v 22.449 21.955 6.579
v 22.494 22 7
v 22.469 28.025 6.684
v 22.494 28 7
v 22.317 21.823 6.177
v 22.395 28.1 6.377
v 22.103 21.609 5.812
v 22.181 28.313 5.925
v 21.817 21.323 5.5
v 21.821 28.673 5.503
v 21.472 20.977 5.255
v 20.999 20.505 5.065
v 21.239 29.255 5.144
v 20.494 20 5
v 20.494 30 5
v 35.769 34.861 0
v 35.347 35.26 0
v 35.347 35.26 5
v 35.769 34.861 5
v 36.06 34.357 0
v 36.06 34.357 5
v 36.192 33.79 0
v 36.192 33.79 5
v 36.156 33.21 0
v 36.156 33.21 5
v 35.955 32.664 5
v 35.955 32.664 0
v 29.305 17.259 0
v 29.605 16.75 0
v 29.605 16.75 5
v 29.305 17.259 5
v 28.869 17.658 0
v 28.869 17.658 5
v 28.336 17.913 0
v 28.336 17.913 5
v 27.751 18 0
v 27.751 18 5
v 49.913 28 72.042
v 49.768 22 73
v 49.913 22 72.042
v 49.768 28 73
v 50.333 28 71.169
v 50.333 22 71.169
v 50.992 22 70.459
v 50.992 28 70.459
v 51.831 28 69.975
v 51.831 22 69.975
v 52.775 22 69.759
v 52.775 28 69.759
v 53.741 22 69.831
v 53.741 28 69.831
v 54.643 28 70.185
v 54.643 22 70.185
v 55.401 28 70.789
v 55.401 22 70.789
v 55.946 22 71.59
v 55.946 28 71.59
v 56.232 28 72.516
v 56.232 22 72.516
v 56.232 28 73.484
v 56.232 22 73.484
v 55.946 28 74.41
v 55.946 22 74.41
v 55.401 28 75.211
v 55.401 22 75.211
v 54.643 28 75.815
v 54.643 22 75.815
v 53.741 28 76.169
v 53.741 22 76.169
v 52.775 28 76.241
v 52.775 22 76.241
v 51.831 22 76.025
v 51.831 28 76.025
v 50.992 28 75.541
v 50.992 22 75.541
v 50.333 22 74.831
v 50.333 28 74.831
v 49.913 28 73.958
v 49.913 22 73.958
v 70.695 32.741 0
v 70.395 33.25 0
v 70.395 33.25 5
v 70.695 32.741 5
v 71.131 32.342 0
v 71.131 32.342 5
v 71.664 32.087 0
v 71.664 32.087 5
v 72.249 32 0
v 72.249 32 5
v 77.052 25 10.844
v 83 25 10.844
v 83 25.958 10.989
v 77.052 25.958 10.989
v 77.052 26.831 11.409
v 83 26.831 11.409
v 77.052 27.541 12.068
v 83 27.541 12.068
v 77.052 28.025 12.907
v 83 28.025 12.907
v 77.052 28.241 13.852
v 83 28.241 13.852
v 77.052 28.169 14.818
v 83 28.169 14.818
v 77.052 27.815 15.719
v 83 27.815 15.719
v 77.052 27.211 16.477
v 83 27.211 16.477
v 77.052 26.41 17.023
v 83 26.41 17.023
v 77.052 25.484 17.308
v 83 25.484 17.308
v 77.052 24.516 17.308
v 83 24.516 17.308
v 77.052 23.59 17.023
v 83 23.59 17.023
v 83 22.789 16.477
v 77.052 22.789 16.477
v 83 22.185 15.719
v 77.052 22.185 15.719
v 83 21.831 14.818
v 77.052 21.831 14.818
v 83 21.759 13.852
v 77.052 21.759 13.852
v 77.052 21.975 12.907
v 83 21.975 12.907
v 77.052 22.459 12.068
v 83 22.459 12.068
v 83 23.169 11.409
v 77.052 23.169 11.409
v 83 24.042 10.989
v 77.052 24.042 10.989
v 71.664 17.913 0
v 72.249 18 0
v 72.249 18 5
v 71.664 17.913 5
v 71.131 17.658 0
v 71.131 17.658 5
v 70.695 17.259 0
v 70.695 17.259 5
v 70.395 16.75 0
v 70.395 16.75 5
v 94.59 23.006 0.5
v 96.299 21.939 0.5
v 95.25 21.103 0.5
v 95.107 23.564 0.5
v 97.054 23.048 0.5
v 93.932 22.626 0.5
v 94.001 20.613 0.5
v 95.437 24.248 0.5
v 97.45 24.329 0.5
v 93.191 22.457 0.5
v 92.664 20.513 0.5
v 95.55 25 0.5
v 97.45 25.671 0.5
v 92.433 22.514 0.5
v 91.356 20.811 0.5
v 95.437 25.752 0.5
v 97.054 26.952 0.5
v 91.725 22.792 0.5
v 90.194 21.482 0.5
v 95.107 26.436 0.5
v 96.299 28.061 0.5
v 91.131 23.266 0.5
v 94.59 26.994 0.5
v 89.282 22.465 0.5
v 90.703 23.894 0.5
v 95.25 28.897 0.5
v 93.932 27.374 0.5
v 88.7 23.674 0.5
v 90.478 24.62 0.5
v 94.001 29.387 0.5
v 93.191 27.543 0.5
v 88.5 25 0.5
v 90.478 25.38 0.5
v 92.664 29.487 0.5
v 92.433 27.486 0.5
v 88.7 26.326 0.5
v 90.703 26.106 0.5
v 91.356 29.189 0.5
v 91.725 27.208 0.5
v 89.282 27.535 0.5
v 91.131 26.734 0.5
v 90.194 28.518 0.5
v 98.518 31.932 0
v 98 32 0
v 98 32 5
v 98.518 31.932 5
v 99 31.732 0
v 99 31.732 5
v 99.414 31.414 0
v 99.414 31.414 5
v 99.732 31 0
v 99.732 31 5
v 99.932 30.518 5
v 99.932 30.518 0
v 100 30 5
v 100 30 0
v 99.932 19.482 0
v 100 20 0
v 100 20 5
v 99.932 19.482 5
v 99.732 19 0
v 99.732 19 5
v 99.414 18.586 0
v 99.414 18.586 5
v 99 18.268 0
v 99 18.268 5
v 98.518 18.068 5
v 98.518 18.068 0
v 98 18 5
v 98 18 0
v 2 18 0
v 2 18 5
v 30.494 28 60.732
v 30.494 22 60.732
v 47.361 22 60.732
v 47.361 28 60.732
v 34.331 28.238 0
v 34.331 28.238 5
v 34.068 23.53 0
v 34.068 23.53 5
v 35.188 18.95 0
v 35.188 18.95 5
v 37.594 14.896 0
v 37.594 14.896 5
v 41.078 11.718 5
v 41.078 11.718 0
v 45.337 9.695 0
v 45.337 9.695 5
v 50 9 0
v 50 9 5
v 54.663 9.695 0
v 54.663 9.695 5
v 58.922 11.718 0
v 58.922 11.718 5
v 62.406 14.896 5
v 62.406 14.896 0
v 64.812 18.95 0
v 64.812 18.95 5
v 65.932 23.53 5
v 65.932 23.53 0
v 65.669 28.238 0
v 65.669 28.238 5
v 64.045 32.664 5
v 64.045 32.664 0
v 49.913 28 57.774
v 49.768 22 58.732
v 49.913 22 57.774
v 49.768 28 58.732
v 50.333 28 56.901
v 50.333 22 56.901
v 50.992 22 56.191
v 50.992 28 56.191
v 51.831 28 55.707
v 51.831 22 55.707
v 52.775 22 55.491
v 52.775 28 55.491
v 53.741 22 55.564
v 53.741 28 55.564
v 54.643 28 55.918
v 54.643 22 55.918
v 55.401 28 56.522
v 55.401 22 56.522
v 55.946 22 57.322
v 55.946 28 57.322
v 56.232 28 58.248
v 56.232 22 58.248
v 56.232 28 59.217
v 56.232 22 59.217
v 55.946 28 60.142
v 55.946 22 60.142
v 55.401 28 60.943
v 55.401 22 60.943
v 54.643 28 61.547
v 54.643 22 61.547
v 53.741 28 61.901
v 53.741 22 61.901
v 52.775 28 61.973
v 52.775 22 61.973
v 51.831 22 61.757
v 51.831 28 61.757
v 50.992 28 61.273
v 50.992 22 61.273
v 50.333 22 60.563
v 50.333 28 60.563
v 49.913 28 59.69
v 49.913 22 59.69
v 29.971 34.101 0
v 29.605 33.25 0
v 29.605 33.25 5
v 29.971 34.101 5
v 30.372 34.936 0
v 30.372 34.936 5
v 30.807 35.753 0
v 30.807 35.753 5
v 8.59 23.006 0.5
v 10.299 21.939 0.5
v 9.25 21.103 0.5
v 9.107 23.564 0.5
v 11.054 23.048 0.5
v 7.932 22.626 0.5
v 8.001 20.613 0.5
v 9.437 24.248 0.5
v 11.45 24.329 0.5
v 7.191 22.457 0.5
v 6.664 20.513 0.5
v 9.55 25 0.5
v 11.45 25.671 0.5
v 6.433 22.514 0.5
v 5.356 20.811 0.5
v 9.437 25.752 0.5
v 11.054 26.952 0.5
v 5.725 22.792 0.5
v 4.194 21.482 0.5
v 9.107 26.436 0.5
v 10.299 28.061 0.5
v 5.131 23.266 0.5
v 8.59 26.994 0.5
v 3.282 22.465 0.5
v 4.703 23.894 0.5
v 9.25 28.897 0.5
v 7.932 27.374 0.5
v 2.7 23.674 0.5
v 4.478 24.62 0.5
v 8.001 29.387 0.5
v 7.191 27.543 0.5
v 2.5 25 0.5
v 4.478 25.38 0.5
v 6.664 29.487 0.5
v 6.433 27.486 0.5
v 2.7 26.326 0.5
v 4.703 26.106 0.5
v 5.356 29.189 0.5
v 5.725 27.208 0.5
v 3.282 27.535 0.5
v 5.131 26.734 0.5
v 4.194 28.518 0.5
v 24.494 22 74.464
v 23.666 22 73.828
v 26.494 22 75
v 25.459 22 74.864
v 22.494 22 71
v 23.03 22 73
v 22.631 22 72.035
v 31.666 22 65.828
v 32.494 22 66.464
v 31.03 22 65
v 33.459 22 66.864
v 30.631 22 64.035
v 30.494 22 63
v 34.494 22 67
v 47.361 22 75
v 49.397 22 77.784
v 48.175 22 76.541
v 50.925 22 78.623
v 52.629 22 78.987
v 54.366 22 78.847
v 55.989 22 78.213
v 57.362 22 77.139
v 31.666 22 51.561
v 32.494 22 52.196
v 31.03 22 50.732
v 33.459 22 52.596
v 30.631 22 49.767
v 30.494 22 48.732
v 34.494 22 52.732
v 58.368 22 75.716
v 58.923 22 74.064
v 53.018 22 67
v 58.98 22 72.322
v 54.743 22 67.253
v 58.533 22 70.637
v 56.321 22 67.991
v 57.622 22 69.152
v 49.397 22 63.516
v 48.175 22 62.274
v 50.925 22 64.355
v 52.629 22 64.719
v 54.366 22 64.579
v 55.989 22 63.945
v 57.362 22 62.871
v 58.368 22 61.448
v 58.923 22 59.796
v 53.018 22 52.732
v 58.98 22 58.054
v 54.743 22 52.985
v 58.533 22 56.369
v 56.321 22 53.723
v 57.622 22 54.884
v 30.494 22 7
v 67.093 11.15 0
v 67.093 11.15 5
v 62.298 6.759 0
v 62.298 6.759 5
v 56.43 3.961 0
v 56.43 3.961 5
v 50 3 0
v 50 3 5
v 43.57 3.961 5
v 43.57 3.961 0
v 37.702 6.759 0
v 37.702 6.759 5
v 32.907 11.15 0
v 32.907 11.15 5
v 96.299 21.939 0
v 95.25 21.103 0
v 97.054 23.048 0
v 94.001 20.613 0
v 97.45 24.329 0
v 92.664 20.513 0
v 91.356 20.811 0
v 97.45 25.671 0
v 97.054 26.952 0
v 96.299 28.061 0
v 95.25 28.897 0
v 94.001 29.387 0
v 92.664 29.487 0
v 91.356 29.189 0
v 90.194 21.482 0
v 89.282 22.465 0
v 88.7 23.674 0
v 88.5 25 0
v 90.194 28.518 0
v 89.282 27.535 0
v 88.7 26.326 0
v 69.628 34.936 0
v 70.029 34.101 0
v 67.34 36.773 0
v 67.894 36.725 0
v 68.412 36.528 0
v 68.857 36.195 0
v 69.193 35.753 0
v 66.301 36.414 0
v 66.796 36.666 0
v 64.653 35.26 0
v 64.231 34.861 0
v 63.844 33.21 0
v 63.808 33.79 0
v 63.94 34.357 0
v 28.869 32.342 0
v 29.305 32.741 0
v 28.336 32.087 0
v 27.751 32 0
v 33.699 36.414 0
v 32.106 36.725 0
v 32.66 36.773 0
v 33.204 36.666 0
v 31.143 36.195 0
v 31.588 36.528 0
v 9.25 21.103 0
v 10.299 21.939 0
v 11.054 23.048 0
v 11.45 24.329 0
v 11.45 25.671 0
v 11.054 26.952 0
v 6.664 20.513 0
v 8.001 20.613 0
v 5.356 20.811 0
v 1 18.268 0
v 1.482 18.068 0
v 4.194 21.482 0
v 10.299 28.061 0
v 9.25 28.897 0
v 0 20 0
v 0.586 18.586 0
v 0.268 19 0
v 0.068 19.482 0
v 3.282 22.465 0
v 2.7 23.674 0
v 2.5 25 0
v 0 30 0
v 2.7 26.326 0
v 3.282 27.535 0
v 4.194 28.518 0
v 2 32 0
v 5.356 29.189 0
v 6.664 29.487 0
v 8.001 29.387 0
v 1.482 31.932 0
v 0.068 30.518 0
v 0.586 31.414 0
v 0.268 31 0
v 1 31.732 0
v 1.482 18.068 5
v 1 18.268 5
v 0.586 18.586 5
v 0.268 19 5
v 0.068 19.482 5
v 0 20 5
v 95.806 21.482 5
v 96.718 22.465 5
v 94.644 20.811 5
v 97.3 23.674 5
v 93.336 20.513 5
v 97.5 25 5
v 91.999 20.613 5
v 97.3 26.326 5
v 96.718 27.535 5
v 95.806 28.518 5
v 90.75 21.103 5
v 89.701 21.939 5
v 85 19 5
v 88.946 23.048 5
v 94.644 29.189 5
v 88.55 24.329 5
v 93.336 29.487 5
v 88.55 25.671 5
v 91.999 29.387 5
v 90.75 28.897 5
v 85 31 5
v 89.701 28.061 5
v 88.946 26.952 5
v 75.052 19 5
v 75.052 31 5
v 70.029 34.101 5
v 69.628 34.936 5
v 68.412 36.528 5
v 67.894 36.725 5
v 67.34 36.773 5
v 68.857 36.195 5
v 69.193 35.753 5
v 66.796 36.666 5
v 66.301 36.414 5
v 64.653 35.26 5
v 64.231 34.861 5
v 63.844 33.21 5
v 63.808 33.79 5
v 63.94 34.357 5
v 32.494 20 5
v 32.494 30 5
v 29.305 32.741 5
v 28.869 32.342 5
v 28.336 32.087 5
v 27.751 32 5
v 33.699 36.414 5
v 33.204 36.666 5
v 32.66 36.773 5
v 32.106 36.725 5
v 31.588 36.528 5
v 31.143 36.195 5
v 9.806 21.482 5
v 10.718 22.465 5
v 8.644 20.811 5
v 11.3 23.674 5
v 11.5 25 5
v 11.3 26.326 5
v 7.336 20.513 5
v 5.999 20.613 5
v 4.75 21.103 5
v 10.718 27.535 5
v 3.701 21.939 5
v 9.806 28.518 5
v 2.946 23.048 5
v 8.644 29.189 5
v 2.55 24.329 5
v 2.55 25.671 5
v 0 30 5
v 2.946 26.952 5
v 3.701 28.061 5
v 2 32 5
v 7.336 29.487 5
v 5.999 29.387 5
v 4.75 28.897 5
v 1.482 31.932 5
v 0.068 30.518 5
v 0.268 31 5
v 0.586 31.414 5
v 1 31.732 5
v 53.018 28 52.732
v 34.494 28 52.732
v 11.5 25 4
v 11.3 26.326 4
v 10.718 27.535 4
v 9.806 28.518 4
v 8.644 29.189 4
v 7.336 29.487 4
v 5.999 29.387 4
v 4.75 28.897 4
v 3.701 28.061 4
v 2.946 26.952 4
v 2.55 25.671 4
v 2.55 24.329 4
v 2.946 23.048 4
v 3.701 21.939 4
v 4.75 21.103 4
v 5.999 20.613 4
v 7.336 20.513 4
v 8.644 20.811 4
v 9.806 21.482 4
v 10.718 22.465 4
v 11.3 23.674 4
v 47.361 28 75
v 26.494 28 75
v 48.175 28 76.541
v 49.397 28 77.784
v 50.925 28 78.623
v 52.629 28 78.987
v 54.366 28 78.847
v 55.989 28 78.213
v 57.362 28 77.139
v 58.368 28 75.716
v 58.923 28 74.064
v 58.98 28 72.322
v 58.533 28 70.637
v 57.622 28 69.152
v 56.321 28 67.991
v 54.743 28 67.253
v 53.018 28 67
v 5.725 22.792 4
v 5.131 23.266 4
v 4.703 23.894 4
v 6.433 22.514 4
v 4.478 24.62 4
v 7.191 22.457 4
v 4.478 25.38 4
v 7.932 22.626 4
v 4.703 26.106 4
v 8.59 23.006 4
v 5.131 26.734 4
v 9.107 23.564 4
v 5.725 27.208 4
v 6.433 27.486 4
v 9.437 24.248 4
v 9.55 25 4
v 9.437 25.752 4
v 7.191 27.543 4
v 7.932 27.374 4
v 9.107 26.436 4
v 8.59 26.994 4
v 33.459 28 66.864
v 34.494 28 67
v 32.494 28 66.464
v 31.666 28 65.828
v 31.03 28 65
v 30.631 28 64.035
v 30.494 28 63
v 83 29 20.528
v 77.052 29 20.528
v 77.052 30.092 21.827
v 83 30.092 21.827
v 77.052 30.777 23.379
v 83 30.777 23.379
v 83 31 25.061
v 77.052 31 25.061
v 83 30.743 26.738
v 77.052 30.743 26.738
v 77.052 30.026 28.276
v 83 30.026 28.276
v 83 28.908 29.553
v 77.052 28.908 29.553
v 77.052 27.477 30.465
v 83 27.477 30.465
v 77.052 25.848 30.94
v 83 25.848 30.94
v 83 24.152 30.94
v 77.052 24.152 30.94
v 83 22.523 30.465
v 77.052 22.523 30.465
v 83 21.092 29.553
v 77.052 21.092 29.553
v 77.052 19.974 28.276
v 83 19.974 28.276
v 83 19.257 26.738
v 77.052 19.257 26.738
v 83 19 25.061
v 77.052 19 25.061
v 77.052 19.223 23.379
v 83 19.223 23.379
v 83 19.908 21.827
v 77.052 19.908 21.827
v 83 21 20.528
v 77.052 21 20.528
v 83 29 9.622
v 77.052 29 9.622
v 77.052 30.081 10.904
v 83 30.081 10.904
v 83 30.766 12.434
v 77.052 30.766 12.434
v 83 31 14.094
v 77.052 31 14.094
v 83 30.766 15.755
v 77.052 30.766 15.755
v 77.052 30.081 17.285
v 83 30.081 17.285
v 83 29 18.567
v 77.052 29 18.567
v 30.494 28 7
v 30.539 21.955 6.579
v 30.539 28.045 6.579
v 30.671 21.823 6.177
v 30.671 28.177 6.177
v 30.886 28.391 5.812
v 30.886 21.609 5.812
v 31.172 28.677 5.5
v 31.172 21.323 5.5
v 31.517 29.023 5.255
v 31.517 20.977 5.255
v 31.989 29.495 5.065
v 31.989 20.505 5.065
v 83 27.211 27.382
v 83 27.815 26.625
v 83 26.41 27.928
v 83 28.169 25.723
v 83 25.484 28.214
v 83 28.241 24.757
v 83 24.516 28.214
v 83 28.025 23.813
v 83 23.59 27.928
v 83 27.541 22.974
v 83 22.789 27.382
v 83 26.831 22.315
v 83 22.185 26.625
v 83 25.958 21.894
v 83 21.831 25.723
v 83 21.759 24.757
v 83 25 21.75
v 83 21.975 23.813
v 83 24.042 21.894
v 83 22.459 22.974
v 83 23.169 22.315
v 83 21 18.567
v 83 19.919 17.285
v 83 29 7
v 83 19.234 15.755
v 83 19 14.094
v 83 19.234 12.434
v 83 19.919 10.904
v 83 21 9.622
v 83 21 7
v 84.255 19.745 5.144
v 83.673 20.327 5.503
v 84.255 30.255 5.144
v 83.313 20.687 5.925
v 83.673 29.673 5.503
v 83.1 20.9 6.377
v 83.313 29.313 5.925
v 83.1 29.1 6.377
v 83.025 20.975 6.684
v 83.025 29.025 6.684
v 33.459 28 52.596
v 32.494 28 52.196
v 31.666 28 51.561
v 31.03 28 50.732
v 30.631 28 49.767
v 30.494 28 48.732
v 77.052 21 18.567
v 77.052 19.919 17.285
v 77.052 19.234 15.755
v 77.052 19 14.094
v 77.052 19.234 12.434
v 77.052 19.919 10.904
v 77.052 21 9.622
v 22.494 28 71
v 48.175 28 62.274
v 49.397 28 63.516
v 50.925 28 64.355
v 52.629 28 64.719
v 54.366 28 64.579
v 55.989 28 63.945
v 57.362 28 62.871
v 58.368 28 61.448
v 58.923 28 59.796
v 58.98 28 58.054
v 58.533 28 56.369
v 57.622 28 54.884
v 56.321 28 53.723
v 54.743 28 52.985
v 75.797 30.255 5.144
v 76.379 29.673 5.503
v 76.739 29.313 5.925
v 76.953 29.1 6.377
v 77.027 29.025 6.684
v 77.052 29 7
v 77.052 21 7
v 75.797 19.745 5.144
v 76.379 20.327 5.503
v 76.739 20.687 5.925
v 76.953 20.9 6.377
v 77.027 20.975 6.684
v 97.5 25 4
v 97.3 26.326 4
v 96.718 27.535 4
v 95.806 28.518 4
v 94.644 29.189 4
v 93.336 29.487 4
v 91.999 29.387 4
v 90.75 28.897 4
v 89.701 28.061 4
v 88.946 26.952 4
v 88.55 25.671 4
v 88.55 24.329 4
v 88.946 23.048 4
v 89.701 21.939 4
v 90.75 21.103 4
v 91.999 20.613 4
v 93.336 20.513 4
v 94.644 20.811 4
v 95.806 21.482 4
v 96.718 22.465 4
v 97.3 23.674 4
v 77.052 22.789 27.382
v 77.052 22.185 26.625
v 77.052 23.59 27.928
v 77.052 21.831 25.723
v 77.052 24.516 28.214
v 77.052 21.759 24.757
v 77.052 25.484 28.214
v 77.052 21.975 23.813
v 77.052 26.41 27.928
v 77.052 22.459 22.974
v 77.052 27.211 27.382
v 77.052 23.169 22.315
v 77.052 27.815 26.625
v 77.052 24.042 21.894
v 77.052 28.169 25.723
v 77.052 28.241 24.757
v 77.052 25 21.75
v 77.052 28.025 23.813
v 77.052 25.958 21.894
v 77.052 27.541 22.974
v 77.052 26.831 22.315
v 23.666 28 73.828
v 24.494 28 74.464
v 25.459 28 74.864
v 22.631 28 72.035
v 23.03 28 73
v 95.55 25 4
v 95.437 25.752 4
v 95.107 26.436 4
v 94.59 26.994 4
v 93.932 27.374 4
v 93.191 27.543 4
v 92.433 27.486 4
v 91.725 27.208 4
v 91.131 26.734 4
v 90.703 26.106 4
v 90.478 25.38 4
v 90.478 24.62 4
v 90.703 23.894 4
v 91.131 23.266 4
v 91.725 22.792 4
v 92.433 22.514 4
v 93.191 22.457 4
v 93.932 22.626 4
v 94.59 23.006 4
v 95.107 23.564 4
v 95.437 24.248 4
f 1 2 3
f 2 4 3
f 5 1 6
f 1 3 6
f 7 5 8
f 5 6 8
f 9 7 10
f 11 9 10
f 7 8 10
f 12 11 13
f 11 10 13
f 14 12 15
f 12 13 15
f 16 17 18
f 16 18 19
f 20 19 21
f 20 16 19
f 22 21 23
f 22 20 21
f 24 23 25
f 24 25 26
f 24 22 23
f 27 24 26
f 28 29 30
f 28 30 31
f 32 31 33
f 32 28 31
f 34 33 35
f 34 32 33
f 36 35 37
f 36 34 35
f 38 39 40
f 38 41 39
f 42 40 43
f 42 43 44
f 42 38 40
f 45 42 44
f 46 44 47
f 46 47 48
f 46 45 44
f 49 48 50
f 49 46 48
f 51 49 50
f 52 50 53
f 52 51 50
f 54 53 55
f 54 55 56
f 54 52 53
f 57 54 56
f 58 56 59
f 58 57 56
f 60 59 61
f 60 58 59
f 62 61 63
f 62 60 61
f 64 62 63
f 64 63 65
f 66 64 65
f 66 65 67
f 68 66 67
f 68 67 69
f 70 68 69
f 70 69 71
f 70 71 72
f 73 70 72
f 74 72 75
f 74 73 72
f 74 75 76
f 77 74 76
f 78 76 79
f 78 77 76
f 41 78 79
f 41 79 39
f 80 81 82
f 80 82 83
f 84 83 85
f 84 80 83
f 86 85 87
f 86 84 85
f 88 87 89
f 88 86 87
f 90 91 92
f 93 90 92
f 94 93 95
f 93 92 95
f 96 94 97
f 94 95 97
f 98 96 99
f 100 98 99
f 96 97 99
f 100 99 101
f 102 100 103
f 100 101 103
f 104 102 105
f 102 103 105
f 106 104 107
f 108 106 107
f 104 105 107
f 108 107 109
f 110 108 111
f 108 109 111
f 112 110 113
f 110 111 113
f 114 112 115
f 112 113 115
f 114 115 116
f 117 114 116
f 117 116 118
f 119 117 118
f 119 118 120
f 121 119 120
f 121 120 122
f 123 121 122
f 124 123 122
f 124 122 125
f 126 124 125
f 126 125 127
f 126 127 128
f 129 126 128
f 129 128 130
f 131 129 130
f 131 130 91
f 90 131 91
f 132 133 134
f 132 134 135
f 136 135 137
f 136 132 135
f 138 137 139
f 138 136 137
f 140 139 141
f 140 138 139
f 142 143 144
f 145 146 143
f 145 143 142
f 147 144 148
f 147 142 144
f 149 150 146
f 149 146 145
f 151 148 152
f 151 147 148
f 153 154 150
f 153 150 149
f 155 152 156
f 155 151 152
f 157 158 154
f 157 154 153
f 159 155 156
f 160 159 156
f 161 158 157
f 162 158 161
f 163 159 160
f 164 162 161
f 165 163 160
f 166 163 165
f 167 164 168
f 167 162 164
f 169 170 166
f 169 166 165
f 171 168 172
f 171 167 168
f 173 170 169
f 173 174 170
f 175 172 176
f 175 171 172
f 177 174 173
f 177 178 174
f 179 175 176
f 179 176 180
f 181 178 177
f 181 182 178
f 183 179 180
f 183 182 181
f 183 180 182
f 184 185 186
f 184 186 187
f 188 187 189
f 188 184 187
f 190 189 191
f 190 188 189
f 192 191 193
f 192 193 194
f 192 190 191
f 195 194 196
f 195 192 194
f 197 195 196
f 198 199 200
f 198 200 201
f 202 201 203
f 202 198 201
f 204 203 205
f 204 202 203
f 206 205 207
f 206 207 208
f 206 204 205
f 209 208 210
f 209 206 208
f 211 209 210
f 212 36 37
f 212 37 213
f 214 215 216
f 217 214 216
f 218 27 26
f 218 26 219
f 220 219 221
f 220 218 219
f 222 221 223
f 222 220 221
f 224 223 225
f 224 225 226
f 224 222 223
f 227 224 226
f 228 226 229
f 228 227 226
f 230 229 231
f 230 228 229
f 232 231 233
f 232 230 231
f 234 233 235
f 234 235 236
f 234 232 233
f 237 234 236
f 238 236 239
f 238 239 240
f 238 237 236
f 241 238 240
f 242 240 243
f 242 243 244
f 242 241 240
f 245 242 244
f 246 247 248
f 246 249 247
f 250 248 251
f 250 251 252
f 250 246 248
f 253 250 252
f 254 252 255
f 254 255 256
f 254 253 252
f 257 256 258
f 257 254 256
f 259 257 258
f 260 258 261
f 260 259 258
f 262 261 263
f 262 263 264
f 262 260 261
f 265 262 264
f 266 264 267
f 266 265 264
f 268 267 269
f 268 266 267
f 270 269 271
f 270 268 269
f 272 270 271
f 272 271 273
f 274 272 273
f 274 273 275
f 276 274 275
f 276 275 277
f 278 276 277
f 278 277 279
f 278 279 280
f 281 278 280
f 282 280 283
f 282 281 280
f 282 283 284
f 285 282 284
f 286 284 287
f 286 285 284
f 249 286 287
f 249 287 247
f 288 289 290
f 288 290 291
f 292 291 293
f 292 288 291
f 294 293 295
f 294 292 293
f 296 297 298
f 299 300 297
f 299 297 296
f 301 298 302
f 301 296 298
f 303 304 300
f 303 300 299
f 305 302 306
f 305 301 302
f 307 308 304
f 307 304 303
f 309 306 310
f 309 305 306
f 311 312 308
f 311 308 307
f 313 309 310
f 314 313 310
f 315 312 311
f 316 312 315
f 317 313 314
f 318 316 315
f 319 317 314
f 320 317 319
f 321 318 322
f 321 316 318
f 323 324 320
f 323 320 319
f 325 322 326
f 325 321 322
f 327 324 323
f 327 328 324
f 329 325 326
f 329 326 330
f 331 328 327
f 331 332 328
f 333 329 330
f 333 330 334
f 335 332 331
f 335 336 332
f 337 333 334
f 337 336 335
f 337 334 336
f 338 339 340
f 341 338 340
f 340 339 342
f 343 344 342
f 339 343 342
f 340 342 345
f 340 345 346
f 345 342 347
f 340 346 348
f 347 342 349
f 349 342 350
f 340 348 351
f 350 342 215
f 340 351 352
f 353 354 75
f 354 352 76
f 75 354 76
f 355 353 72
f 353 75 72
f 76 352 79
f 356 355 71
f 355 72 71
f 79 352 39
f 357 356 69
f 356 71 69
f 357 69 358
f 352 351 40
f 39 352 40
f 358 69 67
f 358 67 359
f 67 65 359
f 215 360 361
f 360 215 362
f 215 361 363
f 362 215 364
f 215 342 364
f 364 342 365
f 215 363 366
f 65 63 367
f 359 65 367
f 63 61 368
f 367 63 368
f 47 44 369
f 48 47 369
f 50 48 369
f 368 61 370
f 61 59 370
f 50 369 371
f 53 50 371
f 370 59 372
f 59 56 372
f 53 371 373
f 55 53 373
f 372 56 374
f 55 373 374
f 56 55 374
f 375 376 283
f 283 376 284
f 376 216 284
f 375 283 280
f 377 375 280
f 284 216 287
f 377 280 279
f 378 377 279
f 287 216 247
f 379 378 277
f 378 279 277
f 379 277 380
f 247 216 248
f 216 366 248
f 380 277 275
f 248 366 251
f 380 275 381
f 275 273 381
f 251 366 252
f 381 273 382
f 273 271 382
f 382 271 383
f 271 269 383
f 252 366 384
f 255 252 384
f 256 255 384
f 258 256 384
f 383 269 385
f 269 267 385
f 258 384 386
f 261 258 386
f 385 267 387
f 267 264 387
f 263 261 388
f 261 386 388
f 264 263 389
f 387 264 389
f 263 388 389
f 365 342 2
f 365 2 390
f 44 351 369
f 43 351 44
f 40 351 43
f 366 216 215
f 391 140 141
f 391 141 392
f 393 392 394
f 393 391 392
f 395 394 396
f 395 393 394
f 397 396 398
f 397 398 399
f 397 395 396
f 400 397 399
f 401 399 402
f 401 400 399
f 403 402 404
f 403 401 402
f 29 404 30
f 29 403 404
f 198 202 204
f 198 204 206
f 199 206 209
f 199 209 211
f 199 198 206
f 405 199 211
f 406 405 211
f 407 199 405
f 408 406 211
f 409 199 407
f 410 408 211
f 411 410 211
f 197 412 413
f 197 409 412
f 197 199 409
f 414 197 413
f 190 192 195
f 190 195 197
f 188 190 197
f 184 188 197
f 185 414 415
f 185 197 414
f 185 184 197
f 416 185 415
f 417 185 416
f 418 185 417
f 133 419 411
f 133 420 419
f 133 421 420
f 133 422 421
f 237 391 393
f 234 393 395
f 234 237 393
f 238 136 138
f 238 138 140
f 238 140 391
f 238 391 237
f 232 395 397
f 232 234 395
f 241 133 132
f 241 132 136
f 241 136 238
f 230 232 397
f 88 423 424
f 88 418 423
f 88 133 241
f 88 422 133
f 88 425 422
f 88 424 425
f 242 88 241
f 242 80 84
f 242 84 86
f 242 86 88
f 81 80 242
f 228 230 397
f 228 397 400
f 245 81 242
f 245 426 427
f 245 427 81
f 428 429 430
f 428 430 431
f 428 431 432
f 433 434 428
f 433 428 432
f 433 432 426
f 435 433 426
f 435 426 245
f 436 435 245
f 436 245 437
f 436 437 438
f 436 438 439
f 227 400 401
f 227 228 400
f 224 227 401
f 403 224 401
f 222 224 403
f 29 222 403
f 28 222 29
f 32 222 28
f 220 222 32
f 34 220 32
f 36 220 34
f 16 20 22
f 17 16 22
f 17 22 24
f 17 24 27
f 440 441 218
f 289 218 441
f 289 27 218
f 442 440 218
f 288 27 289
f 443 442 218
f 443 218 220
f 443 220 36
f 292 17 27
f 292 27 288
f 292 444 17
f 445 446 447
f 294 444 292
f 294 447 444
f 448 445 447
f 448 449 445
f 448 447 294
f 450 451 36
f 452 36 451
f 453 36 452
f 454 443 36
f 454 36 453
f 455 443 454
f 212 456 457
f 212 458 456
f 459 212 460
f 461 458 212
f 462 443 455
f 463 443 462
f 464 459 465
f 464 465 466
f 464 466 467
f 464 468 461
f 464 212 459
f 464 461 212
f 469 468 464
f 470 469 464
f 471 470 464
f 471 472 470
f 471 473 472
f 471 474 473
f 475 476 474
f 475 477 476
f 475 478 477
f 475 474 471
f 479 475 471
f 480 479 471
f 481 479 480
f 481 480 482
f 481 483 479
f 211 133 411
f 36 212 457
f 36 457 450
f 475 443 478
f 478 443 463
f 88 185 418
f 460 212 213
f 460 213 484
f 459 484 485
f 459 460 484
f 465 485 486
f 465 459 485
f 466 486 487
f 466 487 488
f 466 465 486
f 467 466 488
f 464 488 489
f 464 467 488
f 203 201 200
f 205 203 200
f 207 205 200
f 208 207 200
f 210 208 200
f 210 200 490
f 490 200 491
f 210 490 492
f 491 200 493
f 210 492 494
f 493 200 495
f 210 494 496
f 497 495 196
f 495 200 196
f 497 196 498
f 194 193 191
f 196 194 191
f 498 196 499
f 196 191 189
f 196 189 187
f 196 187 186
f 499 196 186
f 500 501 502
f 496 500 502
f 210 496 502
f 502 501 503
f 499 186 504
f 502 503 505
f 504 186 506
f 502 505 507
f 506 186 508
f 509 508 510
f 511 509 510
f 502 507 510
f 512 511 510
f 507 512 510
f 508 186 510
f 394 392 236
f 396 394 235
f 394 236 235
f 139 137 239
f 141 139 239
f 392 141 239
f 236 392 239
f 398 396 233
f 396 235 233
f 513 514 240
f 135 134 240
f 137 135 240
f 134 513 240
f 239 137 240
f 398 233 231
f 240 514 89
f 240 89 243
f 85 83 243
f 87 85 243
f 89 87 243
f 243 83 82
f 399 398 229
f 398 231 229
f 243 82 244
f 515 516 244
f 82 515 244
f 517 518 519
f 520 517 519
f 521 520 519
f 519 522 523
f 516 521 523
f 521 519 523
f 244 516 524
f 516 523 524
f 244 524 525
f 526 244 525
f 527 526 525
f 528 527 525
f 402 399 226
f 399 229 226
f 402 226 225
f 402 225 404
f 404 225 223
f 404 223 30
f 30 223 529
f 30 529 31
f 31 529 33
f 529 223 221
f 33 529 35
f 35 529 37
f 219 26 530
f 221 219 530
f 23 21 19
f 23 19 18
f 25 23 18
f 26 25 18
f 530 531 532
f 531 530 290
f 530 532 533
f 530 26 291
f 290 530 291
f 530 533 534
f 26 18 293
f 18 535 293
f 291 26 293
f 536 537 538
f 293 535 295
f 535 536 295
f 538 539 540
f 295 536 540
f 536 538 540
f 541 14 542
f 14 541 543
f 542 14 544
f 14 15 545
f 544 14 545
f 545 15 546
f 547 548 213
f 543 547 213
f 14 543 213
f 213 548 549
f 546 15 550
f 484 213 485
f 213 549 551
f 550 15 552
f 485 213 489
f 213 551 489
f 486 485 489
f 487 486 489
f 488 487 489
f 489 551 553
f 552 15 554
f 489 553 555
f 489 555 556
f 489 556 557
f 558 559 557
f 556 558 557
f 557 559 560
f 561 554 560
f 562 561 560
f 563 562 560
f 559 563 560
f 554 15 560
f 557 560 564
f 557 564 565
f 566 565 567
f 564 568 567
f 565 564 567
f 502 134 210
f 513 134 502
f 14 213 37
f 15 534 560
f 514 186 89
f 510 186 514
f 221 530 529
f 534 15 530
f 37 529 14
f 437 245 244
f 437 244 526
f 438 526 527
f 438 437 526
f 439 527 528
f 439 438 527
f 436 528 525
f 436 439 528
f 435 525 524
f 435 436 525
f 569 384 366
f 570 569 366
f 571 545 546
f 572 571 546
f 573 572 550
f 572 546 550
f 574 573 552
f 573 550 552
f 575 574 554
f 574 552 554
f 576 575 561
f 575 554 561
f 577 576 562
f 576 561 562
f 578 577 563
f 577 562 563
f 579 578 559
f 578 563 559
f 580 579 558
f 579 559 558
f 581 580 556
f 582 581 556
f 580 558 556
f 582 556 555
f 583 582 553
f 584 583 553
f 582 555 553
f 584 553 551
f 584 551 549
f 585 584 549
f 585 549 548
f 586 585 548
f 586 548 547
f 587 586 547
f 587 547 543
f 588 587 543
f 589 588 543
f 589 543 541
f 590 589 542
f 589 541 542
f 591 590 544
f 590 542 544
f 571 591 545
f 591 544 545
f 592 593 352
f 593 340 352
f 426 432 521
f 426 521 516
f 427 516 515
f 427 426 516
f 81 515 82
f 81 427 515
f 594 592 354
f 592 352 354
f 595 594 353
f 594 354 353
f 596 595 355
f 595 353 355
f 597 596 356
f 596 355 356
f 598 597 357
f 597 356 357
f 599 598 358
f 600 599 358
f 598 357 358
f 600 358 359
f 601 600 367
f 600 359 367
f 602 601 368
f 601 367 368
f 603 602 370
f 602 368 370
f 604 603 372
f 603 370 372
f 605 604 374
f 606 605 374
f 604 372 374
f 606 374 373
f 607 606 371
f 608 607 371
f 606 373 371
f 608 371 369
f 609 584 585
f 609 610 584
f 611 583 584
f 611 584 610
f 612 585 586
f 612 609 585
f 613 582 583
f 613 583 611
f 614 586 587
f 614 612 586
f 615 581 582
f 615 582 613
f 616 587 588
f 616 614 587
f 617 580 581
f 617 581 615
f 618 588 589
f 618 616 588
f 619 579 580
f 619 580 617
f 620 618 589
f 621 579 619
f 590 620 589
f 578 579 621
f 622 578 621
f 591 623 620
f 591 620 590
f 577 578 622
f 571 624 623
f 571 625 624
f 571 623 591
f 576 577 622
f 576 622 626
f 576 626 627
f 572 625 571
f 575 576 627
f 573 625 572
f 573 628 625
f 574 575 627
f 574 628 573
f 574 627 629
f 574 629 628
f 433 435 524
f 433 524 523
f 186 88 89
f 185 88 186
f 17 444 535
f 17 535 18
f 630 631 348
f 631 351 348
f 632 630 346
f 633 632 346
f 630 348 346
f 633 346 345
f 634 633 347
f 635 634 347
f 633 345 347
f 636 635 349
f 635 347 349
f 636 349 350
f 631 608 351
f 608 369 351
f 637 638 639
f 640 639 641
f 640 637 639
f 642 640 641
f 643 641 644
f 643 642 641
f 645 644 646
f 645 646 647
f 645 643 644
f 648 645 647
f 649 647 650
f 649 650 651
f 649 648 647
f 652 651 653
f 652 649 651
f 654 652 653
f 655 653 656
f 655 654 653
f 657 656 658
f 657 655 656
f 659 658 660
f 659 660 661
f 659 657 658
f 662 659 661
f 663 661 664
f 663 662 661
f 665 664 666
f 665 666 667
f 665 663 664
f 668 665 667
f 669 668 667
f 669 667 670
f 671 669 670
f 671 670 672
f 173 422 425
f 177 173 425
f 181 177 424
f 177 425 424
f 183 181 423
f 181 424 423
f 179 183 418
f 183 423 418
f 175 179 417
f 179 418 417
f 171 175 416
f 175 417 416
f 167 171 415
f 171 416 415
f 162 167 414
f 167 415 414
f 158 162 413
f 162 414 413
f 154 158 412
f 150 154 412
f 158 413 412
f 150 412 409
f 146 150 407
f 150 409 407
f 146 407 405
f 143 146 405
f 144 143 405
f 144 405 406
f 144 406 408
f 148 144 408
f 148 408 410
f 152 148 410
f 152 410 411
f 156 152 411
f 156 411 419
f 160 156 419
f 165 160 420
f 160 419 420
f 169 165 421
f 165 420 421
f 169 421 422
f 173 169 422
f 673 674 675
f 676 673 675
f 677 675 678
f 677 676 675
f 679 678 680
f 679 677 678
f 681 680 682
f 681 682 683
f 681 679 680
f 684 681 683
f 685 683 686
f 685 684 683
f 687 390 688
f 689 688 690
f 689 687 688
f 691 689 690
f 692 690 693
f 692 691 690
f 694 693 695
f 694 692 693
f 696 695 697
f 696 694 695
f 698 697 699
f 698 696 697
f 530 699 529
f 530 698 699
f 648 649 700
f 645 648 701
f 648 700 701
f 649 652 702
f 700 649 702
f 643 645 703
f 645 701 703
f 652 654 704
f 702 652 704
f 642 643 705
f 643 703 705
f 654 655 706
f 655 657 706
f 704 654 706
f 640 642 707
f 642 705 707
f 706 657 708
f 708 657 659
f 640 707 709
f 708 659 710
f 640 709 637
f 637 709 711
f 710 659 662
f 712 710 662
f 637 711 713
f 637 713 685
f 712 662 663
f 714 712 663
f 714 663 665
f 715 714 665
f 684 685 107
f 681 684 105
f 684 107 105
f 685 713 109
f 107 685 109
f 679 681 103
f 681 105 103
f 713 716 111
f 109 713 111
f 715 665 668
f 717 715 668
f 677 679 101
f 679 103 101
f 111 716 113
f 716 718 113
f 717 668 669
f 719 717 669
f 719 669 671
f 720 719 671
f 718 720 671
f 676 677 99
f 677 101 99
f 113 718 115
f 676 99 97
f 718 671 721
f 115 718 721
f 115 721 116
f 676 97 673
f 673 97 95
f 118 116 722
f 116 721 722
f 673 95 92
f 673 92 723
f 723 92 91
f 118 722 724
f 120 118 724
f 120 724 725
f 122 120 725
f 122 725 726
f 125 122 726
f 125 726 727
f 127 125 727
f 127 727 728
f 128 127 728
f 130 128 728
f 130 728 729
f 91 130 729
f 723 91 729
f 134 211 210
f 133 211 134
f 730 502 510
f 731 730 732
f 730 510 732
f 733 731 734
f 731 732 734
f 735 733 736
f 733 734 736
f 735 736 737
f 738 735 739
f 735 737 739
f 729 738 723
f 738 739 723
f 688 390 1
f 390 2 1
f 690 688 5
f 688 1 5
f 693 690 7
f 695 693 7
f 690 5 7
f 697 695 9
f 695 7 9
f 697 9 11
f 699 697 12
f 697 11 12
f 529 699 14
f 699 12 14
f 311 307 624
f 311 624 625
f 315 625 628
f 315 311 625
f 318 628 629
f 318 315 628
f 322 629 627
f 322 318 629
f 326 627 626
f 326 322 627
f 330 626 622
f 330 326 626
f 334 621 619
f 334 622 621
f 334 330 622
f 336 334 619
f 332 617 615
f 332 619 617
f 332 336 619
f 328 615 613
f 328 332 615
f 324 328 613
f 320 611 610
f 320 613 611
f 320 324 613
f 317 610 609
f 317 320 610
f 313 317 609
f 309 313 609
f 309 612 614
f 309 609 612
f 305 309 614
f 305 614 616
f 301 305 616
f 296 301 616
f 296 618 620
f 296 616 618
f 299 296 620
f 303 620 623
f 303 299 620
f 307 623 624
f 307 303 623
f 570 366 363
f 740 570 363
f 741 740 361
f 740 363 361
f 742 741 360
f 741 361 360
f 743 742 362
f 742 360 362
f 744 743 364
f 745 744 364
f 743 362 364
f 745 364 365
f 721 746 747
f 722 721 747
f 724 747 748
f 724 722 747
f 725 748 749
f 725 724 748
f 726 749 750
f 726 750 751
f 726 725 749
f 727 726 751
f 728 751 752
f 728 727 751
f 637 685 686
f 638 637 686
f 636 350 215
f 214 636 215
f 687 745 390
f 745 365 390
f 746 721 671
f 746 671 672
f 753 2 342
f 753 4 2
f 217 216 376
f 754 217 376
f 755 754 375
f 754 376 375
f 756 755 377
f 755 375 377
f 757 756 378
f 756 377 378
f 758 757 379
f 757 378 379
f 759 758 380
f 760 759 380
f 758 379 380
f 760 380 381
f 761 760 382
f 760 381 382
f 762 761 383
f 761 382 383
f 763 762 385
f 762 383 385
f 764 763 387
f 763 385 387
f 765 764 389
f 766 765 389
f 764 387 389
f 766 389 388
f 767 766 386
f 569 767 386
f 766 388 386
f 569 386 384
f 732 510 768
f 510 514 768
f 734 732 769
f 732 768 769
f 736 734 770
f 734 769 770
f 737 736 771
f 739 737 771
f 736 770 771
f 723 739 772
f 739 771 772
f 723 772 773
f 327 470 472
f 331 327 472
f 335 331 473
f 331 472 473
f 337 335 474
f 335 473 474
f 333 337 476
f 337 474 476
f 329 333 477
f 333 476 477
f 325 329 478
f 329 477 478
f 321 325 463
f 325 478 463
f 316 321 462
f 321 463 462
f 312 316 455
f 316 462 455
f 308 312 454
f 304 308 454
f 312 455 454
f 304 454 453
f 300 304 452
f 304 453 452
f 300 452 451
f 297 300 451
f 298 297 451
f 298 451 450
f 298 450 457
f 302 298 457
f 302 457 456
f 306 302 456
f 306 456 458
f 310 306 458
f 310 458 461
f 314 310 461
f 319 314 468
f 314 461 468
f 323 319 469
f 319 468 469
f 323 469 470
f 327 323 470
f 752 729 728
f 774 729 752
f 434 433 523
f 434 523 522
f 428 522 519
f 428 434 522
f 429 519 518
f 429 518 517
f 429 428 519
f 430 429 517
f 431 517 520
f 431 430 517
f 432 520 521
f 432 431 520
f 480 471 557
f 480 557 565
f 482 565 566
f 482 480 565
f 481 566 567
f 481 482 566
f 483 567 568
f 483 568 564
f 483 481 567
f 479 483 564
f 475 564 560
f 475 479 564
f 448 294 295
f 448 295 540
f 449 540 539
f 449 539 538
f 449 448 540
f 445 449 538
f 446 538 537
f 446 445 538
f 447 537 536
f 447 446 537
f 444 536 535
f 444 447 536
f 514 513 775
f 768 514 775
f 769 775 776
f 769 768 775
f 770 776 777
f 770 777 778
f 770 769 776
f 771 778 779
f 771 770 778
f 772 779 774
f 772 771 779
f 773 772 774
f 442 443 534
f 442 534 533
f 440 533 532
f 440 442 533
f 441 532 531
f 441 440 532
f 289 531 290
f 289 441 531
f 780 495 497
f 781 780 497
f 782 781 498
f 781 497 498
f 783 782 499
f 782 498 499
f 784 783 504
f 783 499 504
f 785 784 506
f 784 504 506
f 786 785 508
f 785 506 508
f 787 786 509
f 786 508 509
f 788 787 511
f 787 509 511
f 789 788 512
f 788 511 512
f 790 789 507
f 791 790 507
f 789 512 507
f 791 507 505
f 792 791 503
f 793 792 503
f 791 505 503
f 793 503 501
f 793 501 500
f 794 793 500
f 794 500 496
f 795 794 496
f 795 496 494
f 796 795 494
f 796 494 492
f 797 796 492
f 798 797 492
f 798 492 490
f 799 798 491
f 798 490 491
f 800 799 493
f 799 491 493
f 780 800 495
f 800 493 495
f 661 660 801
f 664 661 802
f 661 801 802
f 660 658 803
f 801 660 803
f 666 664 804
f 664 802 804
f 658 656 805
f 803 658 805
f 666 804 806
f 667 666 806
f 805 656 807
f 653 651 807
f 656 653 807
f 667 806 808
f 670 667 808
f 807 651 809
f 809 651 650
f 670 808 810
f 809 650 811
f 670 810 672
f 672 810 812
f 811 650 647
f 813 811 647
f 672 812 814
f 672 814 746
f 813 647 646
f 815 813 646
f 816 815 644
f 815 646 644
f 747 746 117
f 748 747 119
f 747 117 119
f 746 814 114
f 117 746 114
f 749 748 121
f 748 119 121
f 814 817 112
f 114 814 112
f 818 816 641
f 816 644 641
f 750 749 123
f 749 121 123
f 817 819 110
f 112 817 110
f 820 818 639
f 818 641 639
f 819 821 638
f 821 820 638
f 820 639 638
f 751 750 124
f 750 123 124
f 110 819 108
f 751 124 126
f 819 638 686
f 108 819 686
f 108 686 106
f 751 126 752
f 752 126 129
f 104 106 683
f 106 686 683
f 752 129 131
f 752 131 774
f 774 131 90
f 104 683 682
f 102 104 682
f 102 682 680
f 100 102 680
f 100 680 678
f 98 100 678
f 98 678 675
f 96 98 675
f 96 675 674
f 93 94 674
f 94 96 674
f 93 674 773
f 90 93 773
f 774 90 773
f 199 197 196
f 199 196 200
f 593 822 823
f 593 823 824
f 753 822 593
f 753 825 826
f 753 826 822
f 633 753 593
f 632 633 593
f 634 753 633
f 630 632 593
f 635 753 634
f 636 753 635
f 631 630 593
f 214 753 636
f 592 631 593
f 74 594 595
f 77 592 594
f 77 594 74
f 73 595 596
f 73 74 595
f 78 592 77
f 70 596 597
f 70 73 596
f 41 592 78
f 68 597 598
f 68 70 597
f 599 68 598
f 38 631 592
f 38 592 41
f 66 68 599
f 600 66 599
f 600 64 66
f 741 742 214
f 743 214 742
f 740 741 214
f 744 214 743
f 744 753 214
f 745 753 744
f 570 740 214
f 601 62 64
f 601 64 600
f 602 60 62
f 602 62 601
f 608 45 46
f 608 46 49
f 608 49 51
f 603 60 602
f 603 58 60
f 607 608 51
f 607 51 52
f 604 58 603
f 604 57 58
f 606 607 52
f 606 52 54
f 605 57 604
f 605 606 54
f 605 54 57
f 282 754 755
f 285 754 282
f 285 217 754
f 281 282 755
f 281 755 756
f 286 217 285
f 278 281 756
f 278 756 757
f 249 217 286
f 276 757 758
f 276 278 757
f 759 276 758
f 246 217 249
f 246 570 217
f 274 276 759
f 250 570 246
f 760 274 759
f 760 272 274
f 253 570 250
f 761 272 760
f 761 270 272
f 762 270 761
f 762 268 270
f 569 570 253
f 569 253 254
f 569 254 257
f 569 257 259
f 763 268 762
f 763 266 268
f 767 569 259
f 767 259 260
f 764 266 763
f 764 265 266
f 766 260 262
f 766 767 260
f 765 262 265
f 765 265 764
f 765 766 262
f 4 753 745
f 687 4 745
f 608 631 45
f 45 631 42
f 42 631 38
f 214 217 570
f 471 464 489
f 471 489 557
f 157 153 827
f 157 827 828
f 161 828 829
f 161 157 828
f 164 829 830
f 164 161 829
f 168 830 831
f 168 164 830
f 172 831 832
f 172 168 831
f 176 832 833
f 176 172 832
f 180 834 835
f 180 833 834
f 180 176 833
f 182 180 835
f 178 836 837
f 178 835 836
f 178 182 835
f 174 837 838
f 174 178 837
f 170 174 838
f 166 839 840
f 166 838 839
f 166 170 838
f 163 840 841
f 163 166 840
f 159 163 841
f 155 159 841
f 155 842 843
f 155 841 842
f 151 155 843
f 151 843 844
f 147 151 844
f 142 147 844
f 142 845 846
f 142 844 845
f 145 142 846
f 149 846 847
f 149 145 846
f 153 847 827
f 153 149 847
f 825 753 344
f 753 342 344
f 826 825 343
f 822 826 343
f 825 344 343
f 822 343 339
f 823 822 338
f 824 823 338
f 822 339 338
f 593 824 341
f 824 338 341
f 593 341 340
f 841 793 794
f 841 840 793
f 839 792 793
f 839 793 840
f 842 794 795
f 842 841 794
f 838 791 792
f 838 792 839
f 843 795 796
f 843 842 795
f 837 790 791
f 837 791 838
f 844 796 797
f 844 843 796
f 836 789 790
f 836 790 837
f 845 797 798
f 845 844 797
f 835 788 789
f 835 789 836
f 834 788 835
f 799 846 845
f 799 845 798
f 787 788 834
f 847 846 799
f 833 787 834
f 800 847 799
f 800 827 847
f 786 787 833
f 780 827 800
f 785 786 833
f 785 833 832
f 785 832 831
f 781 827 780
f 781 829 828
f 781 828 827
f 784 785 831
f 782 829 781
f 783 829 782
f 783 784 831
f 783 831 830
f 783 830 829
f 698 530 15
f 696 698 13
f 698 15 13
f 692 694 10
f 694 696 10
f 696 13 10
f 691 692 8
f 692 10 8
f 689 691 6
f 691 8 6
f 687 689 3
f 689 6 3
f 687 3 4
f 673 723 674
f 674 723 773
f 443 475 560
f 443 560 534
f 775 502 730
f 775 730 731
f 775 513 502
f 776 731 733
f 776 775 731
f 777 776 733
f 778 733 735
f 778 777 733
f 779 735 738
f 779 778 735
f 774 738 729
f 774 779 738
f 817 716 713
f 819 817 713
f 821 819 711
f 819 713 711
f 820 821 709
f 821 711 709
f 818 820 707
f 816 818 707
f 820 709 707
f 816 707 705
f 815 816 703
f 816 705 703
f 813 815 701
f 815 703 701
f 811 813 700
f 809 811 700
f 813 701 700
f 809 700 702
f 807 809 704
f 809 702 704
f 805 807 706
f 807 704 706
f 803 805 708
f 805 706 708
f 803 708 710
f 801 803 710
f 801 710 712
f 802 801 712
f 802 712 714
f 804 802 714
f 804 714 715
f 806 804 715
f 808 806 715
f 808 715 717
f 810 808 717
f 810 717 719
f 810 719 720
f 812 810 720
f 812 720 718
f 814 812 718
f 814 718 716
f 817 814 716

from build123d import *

# Parameters (mm, degrees)
SKETCH1_R                = 2.55
BOSS_EXTRUDE1_DEPTH      = 5
SKETCH4_R                = 4.5
CUT_EXTRUDE2_DEPTH       = 1
SKETCH6_W                = 5.947651005
SKETCH6_H                = 20
BOSS_EXTRUDE2_DEPTH      = 4
BOSS_EXTRUDE2_DEPTH_BACK = 4
SKETCH11_R               = 4.5
CUT_EXTRUDE3_DEPTH       = 0.5
SKETCH16_R               = 3.25
BOSS_EXTRUDE3_DEPTH      = 3
BOSS_EXTRUDE3_DEPTH_BACK = 3
FILLET3_R                = 2
BOSS_EXTRUDE4_DEPTH      = 5.947651
CUT_EXTRUDE5_REACH       = 85
SKETCH18_R               = 3.25


with BuildPart() as part:
    # Sketch1 → Boss-Extrude1 (new body)
    with BuildSketch(Plane.XY):
        with BuildLine():
            Line((100, 25), (100, 20))
            ThreePointArc((100, 20), (99.414213562, 18.585786438), (98, 18))
            Line((98, 18), (72.248595461, 18))
            ThreePointArc((72.248595461, 18), (71.130561473, 17.658312395), (70.39454584, 16.75))
            ThreePointArc((70.39454584, 16.75), (50, 3), (29.60545416, 16.75))
            ThreePointArc((29.60545416, 16.75), (28.869438527, 17.658312395), (27.751404539, 18))
            Line((27.751404539, 18), (2, 18))
            ThreePointArc((2, 18), (0.585786438, 18.585786438), (0, 20))
            Line((0, 20), (0, 25))
            Line((0, 25), (0, 30))
            ThreePointArc((0, 30), (0.585786438, 31.414213562), (2, 32))
            Line((2, 32), (21.056240945, 32))
            Line((21.056240945, 32), (27.751404539, 32))
            ThreePointArc((27.751404539, 32), (28.869438527, 32.341687605), (29.60545416, 33.25))
            ThreePointArc((29.60545416, 33.25), (30.166752838, 34.520625347), (30.807119991, 35.753295167))
            ThreePointArc((30.807119991, 35.753295167), (32.106461975, 36.725482012), (33.699080137, 36.414026968))
            Line((33.699080137, 36.414026968), (35.34656276, 35.260447216))
            ThreePointArc((35.34656276, 35.260447216), (36.146649881, 34.078494315), (35.955031011, 32.664127224))
            ThreePointArc((35.955031011, 32.664127224), (50, 9), (64.044968989, 32.664127224))
            ThreePointArc((64.044968989, 32.664127224), (63.853350119, 34.078494315), (64.65343724, 35.260447216))
            Line((64.65343724, 35.260447216), (66.300919863, 36.414026968))
            ThreePointArc((66.300919863, 36.414026968), (67.893538025, 36.725482012), (69.192880009, 35.753295167))
            ThreePointArc((69.192880009, 35.753295167), (69.833247162, 34.520625347), (70.39454584, 33.25))
            ThreePointArc((70.39454584, 33.25), (71.130561473, 32.341687605), (72.248595461, 32))
            Line((72.248595461, 32), (78.943759055, 32))
            Line((78.943759055, 32), (98, 32))
            ThreePointArc((98, 32), (99.414213562, 31.414213562), (100, 30))
            Line((100, 30), (100, 25))
        make_face()
        with Locations((93, 25)):
            Circle(SKETCH1_R, mode=Mode.SUBTRACT)
        with Locations((7, 25)):
            Circle(SKETCH1_R, mode=Mode.SUBTRACT)
    extrude(amount=BOSS_EXTRUDE1_DEPTH)

    # Sketch4 → Cut-Extrude2 (cut)
    with BuildSketch(Plane.XY.offset(5)):
        with Locations((93, 25)):
            Circle(SKETCH4_R)
        with Locations((7, 25)):
            Circle(SKETCH4_R)
    extrude(amount=-CUT_EXTRUDE2_DEPTH, mode=Mode.SUBTRACT)

    # Sketch6 → Boss-Extrude2 (add, two sides)
    with BuildSketch(Plane(origin=(0, 25, 0), x_dir=(-1, 0, 0), z_dir=(0, -1, 0))) as boss_extrude2_sk:
        with Locations((-80.026174497, -15)):
            Rectangle(SKETCH6_W, SKETCH6_H)
    extrude(amount=BOSS_EXTRUDE2_DEPTH)
    extrude(boss_extrude2_sk.sketch, amount=-BOSS_EXTRUDE2_DEPTH_BACK)

    # Sketch11 → Cut-Extrude3 (cut)
    with BuildSketch(Plane(origin=(0, 0, 0), x_dir=(-1, 0, 0), z_dir=(0, 0, -1))):
        with Locations((-93, 25)):
            Circle(SKETCH11_R)
        with Locations((-7, 25)):
            Circle(SKETCH11_R)
    extrude(amount=-CUT_EXTRUDE3_DEPTH, mode=Mode.SUBTRACT)

    # Sketch16 → Boss-Extrude3 (add, two sides)
    with BuildSketch(Plane(origin=(0, 25, 0), x_dir=(-1, 0, 0), z_dir=(0, -1, 0))) as boss_extrude3_sk:
        with BuildLine():
            Line((-30.494270905, -5), (-22.494270905, -5))
            Line((-22.494270905, -5), (-22.494270905, -71))
            ThreePointArc((-22.494270905, -71), (-23.665843781, -73.828427125), (-26.494270905, -75))
            Line((-26.494270905, -75), (-30.494270905, -75))
            Line((-30.494270905, -75), (-47.361403242, -75))
            ThreePointArc((-47.361403242, -75), (-57.917236977, -76.464101615), (-53.018257491, -67))
            Line((-53.018257491, -67), (-34.494270905, -67))
            ThreePointArc((-34.494270905, -67), (-31.665843781, -65.828427125), (-30.494270905, -63))
            Line((-30.494270905, -63), (-30.494270905, -60.732138804))
            Line((-30.494270905, -60.732138804), (-47.361403242, -60.732138804))
            ThreePointArc((-47.361403242, -60.732138804), (-57.917236977, -62.196240419), (-53.018257491, -52.732138804))
            Line((-53.018257491, -52.732138804), (-34.494270905, -52.732138804))
            ThreePointArc((-34.494270905, -52.732138804), (-31.665843781, -51.560565928), (-30.494270905, -48.732138804))
            Line((-30.494270905, -48.732138804), (-30.494270905, -5))
        make_face()
        with Locations((-53.018257491, -73)):
            Circle(SKETCH16_R, mode=Mode.SUBTRACT)
        with Locations((-53.018257491, -58.732138804)):
            Circle(SKETCH16_R, mode=Mode.SUBTRACT)
    extrude(amount=BOSS_EXTRUDE3_DEPTH)
    extrude(boss_extrude3_sk.sketch, amount=-BOSS_EXTRUDE3_DEPTH_BACK)

    # Fillet3
    fillet3_edges = [part.edges().sort_by_distance(p)[0] for p in [
        (83, 25, 5),
        (80.026174498, 29, 5),
        (77.052348995, 25, 5),
        (80.026174498, 21, 5),
        (30.494270905, 25, 5),
        (26.494270905, 28, 5),
        (22.494270905, 25, 5),
        (26.494270905, 22, 5),
    ]]
    fillet(fillet3_edges, radius=FILLET3_R)

    # Sketch17 → Boss-Extrude4 (add)
    with BuildSketch(Plane(origin=(83, 0, 0), x_dir=(0, 0, -1), z_dir=(1, 0, 0))):
        with BuildLine():
            ThreePointArc((-19.547210182, 27.503414308), (-31, 25), (-19.547210182, 22.496585692))
            ThreePointArc((-19.547210182, 22.496585692), (-8.094420363, 25), (-19.547210182, 27.503414308))
        make_face()
    extrude(amount=-BOSS_EXTRUDE4_DEPTH)

    # Sketch18 → Cut-Extrude5 (cut, up to next)
    with BuildSketch(Plane(origin=(83, 0, 0), x_dir=(0, 0, -1), z_dir=(1, 0, 0)), mode=Mode.PRIVATE) as cut_extrude5_sk1:
        with Locations((-25, 25)):
            Circle(SKETCH18_R)
    cut_extrude5_tool1 = extrude(cut_extrude5_sk1.sketch, amount=-CUT_EXTRUDE5_REACH, mode=Mode.PRIVATE) & part.part
    add(cut_extrude5_tool1.solids().sort_by_distance((83, 25, 25))[0], mode=Mode.SUBTRACT)
    # Sketch18 → Cut-Extrude5 (cut, up to next)
    with BuildSketch(Plane(origin=(83, 0, 0), x_dir=(0, 0, -1), z_dir=(1, 0, 0)), mode=Mode.PRIVATE) as cut_extrude5_sk2:
        with Locations((-14.094420363, 25)):
            Circle(SKETCH18_R)
    cut_extrude5_tool2 = extrude(cut_extrude5_sk2.sketch, amount=-CUT_EXTRUDE5_REACH, mode=Mode.PRIVATE) & part.part
    add(cut_extrude5_tool2.solids().sort_by_distance((83, 25, 14.09442))[0], mode=Mode.SUBTRACT)


solid = part.part
